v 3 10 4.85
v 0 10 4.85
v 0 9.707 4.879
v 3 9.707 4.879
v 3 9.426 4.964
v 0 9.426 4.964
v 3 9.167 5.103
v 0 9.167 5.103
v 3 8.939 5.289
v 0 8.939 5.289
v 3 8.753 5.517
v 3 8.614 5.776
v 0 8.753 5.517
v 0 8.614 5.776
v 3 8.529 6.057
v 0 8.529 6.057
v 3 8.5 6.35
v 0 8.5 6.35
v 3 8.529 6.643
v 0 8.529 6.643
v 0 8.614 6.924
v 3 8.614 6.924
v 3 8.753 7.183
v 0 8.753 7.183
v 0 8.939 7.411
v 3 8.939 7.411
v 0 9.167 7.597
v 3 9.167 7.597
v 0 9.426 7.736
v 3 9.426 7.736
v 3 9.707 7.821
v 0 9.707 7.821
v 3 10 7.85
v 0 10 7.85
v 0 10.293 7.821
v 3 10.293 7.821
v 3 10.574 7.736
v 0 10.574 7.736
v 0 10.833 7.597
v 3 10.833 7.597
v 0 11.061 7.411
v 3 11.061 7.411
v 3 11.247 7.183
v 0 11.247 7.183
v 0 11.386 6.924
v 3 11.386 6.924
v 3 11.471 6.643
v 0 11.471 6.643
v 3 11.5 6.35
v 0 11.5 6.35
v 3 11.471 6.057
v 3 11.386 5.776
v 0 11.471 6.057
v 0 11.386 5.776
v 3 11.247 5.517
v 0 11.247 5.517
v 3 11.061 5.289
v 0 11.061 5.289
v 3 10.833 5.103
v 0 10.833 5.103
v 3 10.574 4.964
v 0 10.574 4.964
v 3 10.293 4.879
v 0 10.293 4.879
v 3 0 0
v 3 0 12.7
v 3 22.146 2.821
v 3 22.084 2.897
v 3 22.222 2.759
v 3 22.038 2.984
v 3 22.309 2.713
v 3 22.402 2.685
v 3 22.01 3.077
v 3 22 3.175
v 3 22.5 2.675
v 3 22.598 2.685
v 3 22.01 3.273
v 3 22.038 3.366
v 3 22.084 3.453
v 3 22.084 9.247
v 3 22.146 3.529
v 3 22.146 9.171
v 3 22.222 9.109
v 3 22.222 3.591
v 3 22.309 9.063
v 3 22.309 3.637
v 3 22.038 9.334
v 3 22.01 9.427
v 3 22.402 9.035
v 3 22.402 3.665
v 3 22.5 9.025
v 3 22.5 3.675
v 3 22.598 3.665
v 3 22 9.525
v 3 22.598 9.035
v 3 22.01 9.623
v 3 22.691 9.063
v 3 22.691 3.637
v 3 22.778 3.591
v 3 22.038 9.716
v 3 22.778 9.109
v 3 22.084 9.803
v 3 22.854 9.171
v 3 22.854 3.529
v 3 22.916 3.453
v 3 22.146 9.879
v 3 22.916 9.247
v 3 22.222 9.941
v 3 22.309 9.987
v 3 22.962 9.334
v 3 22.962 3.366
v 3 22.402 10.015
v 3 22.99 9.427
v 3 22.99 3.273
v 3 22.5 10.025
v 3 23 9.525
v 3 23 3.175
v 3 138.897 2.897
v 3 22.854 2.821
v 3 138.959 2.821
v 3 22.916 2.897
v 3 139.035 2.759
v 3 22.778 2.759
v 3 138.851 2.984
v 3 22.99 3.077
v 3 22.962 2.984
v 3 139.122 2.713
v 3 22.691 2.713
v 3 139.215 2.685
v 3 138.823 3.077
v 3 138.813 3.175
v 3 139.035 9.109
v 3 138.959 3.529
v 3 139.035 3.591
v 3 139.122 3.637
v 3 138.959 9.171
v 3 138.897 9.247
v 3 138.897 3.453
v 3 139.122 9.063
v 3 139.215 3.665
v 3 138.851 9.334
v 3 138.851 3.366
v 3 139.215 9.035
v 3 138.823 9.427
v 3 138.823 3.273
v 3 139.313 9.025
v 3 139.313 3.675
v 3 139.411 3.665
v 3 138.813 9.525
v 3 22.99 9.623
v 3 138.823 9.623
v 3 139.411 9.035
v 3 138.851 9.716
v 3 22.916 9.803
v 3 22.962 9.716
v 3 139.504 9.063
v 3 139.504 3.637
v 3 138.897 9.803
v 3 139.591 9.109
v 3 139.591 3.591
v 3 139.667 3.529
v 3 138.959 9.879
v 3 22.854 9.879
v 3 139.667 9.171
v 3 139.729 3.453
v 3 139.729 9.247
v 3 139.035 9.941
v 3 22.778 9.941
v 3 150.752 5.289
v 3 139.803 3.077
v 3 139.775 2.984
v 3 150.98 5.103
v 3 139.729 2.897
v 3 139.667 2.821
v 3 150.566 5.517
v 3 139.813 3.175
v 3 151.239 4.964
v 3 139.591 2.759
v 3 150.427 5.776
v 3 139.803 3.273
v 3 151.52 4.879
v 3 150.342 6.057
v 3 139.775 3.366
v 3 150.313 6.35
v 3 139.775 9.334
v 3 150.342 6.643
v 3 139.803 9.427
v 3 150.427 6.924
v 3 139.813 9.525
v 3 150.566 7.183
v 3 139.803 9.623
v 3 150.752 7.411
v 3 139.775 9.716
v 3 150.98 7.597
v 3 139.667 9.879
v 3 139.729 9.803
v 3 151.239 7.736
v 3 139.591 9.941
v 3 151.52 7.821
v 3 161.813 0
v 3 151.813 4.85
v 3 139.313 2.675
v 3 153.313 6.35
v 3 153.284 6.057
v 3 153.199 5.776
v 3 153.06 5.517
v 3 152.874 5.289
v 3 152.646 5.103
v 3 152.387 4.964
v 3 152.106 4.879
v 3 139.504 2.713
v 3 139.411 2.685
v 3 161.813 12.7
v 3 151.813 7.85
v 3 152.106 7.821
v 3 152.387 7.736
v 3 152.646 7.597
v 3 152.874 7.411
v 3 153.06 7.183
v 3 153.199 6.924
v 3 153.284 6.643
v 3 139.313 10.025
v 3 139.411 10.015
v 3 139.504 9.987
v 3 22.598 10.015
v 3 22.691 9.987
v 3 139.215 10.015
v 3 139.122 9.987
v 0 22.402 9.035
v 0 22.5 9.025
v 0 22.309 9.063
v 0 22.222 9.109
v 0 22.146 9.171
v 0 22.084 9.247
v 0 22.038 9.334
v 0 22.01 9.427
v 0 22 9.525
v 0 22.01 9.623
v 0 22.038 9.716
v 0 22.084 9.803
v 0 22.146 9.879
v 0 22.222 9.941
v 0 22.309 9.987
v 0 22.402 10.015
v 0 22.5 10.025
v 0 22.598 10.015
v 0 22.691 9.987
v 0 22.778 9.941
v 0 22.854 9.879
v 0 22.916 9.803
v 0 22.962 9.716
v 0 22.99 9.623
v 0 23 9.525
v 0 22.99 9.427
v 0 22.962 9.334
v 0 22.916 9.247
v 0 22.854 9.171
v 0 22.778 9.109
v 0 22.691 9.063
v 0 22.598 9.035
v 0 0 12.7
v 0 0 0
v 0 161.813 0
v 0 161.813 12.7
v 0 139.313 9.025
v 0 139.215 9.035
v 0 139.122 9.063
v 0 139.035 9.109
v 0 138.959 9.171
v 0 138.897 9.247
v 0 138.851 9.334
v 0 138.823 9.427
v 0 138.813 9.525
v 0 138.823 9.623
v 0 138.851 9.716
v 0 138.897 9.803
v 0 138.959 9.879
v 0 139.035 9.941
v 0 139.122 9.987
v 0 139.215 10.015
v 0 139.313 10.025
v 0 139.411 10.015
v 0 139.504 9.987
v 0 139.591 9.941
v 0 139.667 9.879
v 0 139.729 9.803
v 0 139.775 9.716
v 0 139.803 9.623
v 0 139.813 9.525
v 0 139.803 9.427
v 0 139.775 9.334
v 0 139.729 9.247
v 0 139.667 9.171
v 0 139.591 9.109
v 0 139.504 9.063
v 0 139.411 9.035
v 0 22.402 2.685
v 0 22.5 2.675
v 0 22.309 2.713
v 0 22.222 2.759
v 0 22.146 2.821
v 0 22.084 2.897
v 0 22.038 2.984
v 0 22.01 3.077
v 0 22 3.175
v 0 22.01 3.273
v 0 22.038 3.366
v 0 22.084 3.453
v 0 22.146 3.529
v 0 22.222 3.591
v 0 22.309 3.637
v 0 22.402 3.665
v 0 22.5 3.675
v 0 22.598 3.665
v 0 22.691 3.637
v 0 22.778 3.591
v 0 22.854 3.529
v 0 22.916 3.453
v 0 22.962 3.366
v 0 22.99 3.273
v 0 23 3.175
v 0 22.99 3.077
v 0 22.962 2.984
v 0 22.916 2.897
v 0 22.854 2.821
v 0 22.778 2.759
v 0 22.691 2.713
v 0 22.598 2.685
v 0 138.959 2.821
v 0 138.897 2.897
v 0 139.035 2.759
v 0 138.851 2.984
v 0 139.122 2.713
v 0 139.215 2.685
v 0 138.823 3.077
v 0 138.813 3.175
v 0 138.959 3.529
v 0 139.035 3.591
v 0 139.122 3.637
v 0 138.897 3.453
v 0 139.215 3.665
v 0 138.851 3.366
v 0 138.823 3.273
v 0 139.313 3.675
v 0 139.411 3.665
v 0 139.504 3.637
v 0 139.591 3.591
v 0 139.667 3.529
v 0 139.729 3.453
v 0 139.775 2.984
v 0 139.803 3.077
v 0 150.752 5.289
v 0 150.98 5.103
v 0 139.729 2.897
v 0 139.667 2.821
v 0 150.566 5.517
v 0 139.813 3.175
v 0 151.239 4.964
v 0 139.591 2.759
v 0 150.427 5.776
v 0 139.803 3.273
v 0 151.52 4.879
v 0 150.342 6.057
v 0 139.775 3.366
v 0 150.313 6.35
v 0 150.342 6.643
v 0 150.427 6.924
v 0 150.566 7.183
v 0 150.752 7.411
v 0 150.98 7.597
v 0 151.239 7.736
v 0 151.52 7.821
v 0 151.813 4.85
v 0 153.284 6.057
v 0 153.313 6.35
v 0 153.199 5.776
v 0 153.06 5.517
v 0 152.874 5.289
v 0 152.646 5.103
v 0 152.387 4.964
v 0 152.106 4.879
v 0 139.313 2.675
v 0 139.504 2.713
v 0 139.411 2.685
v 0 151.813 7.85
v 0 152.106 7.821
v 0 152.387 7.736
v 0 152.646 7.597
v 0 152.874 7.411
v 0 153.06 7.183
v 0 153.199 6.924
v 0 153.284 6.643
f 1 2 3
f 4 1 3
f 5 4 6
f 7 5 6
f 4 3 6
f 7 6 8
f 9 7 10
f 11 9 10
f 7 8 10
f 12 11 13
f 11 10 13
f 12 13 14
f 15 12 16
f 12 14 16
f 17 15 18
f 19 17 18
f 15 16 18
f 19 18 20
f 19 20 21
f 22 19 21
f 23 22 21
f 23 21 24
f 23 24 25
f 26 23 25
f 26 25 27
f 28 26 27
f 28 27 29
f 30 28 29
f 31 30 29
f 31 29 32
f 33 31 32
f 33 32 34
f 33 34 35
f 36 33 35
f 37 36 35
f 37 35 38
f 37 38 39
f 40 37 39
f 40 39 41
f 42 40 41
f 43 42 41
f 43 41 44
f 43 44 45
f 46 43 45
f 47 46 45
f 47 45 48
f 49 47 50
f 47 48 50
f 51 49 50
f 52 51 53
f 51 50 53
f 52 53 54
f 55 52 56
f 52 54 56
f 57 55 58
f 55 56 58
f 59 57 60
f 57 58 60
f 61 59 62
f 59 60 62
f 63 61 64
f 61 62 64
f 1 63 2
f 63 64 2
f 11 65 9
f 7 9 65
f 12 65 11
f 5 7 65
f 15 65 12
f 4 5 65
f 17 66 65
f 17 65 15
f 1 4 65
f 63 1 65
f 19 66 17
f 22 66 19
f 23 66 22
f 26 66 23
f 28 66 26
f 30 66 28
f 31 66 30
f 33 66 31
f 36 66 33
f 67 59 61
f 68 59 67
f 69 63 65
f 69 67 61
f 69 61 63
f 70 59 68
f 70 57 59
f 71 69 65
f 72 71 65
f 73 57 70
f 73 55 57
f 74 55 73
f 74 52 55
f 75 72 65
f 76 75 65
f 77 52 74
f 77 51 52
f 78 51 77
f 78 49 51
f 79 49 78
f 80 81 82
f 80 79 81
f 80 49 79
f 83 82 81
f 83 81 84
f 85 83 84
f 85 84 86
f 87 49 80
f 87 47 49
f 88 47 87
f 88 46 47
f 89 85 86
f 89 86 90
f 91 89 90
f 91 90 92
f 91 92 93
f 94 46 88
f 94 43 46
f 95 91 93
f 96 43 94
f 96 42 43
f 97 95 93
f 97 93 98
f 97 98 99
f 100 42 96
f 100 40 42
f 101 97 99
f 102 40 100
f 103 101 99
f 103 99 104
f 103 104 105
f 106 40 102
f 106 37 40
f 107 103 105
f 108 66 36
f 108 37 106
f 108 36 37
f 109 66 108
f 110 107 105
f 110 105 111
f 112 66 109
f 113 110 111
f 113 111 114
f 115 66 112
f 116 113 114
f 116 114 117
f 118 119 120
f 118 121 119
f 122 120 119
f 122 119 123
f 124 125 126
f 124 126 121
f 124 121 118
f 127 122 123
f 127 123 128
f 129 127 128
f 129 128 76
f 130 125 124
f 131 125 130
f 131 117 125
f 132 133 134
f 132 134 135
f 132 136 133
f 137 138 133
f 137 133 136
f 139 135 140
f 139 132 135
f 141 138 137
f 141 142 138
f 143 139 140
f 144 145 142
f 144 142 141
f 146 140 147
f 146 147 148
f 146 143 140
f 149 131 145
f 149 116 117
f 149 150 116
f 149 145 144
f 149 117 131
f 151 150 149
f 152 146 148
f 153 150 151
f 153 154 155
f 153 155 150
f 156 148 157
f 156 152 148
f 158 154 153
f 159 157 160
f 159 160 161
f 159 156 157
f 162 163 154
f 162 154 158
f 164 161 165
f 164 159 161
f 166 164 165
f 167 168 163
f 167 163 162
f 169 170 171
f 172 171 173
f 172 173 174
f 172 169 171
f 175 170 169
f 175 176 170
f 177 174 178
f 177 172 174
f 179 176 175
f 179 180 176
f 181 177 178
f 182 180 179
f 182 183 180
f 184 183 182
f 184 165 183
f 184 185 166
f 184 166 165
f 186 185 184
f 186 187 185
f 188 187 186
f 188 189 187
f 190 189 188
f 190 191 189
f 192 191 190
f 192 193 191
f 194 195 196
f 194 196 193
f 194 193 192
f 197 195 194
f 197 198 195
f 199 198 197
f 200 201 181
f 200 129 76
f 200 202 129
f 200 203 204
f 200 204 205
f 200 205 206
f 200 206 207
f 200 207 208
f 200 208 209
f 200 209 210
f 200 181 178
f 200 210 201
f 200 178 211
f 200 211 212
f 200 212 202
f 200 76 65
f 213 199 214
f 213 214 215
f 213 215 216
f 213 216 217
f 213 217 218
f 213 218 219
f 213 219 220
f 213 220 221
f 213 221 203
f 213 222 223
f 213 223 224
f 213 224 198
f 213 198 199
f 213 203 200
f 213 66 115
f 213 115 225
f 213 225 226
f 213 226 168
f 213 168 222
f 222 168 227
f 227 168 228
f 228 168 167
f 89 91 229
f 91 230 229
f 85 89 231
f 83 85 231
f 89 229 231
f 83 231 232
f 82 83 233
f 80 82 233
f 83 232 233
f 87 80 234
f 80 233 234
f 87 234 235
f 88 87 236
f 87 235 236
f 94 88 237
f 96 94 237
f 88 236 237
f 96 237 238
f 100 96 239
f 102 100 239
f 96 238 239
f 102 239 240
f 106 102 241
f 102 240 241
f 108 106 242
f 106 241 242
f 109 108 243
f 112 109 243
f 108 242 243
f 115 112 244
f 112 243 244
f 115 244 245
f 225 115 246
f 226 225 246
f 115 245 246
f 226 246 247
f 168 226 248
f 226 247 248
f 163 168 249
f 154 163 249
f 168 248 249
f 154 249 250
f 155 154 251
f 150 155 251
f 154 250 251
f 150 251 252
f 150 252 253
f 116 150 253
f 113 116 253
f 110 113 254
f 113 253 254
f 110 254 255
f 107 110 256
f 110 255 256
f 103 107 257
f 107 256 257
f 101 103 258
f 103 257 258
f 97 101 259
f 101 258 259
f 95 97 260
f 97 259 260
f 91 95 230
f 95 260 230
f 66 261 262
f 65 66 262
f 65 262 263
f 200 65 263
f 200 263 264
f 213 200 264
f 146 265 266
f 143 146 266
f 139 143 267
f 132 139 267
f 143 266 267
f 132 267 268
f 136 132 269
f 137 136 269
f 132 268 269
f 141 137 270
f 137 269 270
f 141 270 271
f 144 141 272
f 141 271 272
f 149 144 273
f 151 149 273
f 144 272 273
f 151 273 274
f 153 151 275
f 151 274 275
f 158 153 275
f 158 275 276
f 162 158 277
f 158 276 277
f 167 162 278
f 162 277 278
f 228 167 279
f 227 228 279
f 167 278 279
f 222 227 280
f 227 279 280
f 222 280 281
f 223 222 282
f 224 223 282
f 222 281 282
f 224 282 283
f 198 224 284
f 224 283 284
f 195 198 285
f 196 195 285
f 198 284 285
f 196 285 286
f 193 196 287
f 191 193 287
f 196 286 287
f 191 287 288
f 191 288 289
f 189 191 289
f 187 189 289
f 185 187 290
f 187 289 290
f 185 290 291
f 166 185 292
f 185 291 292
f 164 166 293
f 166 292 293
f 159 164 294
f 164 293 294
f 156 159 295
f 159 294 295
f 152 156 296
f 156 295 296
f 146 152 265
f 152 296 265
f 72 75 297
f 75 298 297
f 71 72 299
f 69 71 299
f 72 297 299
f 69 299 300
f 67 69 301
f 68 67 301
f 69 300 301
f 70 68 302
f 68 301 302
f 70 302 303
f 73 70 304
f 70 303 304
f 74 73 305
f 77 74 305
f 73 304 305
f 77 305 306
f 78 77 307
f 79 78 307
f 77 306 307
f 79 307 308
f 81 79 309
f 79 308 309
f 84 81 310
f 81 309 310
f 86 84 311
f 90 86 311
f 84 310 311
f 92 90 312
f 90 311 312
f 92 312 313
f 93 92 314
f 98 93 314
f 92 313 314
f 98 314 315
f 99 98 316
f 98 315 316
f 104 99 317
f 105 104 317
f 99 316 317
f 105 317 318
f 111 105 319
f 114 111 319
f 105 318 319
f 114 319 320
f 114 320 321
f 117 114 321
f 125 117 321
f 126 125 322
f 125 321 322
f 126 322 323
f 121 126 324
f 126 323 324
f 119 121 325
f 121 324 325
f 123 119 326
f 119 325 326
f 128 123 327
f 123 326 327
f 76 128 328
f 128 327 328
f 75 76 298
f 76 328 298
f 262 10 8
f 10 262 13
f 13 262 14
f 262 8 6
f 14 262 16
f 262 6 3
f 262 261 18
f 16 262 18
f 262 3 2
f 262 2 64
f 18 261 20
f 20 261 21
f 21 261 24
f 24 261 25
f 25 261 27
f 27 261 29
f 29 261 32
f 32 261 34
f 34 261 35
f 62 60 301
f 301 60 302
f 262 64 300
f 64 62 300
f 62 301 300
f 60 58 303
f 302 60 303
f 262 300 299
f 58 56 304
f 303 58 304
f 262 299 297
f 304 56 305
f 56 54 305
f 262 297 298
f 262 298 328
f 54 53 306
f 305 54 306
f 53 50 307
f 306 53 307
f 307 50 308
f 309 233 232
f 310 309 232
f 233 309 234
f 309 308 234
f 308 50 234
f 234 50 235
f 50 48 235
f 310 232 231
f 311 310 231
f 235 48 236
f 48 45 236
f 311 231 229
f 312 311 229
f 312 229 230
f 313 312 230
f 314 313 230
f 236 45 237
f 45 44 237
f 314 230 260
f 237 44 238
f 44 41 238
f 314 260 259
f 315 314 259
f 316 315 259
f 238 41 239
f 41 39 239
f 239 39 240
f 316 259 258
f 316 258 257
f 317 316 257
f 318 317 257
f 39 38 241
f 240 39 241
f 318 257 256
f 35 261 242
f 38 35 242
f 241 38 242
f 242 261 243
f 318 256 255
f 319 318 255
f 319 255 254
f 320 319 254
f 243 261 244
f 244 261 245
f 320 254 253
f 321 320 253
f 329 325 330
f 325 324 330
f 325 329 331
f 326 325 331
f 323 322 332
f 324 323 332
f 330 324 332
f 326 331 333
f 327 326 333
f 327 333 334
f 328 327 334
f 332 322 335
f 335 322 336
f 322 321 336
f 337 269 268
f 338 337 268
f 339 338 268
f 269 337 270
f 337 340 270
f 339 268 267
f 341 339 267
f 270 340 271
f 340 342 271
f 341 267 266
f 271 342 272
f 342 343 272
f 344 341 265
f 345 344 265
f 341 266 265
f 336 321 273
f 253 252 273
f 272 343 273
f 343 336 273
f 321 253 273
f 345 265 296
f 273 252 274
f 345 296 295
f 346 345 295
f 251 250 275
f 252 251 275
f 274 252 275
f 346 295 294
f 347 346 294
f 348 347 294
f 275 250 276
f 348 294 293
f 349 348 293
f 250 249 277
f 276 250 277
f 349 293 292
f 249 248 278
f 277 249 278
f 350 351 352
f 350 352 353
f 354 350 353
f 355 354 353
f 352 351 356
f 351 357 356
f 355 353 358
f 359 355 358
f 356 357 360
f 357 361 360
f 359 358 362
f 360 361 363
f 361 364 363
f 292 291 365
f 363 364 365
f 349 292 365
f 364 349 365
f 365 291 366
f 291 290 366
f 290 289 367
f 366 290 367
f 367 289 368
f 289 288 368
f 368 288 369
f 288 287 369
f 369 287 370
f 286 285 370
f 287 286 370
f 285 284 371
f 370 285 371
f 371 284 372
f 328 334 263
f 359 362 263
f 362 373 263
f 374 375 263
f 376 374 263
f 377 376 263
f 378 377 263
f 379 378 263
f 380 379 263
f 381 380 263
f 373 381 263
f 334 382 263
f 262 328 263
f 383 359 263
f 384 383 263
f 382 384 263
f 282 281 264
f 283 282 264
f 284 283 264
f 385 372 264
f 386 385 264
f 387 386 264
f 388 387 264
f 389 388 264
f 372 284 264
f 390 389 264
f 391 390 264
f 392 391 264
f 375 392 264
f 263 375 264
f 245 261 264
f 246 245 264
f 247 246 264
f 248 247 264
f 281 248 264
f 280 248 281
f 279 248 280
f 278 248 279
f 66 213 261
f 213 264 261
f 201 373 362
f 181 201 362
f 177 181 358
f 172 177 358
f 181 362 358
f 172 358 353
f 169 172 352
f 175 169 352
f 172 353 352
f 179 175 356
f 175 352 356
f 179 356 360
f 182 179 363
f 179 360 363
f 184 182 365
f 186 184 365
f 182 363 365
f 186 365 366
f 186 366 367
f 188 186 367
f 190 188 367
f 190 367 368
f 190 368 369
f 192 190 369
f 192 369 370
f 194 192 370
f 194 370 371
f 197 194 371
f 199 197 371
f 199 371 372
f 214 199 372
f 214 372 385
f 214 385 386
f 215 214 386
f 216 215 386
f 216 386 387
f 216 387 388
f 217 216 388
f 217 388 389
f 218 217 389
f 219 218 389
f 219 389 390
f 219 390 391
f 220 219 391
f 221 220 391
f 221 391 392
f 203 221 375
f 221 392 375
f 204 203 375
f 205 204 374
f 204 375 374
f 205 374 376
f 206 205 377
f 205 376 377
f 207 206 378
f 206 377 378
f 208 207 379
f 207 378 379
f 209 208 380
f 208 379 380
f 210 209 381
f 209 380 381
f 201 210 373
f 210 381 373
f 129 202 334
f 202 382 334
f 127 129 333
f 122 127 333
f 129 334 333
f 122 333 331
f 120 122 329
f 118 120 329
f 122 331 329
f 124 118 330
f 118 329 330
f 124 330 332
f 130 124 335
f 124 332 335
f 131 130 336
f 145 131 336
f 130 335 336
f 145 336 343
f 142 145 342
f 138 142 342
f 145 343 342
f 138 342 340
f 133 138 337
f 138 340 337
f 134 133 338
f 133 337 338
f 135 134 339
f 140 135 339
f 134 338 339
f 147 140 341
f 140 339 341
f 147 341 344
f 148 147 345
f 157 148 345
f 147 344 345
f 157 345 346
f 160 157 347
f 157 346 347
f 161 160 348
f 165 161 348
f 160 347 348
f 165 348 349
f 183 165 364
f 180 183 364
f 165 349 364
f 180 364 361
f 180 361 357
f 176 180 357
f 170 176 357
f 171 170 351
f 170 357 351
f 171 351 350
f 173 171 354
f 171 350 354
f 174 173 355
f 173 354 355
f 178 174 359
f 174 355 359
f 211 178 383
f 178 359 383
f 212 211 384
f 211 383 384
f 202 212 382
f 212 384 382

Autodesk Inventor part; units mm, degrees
ref_plane "YZ Plane" through (0, 0, 0) normal (1, 0, 0) x (0, 1, 0)
ref_plane "XZ Plane" through (0, 0, 0) normal (0, 1, 0) x (-1, 0, 0)
ref_plane "XY Plane" through (0, 0, 0) normal (0, 0, 1) x (1, 0, 0)
sketch "Skizze1" plane through (0, 0, 0) normal (1, 0, 0) x (0, 1, 0)
  line L0 (0, 0) -> (161.813, 0)
  line L1 (161.813, 0) -> (161.813, 12.7)
  line L2 (161.813, 12.7) -> (0, 12.7)
  line L3 (0, 12.7) -> (0, 0)
  dimension "d0" = 161.813
  dimension "d1" = 12.7
extrude "Extrusion1" add sketch "Skizze1" along normal blind 3
sketch "Skizze4" plane through (3, 0, 0) normal (1, 0, 0) x (0, 0, -1)
  line L0 (-12.7, 0) -> (0, 0) projected
  line L1 (-6.35, 0) -> (-6.35, 22.5)
  line L2 (-6.35, 0) -> (16.15, 0) construction
  line L3 (-6.35, 22.5) -> (-9.525, 22.5)
  line L4 (-6.35, 22.5) -> (-3.175, 22.5)
  line L5 (0, 161.813) -> (-12.7, 161.813) projected
  line L6 (-6.35, 161.813) -> (-6.35, 139.313)
  line L7 (-6.35, 139.313) -> (-9.525, 139.313)
  line L8 (-6.35, 139.313) -> (-3.175, 139.313)
  dimension "d16" = 22.5
  dimension "d17" = 90
  dimension "d18" = 3.175
  dimension "d19" = 3.175
  dimension "d20" = 22.5
  dimension "d21" = 3.175
  dimension "d22" = 3.175
hole "Bohrung2" at (3, 22.5, 9.525) at (3, 22.5, 3.175) at (3, 139.313, 9.525) at (3, 139.313, 3.175) direction (-1, 0, 0) diameter 1 end through all
sketch "Skizze5" plane through (3, 0, 0) normal (1, 0, 0) x (0, 0, -1)
  line L0 (-12.7, 0) -> (0, 0) projected
  line L1 (-6.35, 0) -> (-6.35, 10)
  line L2 (0, 161.813) -> (-12.7, 161.813) projected
  line L3 (-6.35, 161.813) -> (-6.35, 151.813)
  dimension "d30" = 10
  dimension "d31" = 10
hole "Bohrung3" at (3, 10, 6.35) at (3, 151.813, 6.35) direction (-1, 0, 0) diameter 3 end through all
properties part number "Platte_Kettenglied_unten"
